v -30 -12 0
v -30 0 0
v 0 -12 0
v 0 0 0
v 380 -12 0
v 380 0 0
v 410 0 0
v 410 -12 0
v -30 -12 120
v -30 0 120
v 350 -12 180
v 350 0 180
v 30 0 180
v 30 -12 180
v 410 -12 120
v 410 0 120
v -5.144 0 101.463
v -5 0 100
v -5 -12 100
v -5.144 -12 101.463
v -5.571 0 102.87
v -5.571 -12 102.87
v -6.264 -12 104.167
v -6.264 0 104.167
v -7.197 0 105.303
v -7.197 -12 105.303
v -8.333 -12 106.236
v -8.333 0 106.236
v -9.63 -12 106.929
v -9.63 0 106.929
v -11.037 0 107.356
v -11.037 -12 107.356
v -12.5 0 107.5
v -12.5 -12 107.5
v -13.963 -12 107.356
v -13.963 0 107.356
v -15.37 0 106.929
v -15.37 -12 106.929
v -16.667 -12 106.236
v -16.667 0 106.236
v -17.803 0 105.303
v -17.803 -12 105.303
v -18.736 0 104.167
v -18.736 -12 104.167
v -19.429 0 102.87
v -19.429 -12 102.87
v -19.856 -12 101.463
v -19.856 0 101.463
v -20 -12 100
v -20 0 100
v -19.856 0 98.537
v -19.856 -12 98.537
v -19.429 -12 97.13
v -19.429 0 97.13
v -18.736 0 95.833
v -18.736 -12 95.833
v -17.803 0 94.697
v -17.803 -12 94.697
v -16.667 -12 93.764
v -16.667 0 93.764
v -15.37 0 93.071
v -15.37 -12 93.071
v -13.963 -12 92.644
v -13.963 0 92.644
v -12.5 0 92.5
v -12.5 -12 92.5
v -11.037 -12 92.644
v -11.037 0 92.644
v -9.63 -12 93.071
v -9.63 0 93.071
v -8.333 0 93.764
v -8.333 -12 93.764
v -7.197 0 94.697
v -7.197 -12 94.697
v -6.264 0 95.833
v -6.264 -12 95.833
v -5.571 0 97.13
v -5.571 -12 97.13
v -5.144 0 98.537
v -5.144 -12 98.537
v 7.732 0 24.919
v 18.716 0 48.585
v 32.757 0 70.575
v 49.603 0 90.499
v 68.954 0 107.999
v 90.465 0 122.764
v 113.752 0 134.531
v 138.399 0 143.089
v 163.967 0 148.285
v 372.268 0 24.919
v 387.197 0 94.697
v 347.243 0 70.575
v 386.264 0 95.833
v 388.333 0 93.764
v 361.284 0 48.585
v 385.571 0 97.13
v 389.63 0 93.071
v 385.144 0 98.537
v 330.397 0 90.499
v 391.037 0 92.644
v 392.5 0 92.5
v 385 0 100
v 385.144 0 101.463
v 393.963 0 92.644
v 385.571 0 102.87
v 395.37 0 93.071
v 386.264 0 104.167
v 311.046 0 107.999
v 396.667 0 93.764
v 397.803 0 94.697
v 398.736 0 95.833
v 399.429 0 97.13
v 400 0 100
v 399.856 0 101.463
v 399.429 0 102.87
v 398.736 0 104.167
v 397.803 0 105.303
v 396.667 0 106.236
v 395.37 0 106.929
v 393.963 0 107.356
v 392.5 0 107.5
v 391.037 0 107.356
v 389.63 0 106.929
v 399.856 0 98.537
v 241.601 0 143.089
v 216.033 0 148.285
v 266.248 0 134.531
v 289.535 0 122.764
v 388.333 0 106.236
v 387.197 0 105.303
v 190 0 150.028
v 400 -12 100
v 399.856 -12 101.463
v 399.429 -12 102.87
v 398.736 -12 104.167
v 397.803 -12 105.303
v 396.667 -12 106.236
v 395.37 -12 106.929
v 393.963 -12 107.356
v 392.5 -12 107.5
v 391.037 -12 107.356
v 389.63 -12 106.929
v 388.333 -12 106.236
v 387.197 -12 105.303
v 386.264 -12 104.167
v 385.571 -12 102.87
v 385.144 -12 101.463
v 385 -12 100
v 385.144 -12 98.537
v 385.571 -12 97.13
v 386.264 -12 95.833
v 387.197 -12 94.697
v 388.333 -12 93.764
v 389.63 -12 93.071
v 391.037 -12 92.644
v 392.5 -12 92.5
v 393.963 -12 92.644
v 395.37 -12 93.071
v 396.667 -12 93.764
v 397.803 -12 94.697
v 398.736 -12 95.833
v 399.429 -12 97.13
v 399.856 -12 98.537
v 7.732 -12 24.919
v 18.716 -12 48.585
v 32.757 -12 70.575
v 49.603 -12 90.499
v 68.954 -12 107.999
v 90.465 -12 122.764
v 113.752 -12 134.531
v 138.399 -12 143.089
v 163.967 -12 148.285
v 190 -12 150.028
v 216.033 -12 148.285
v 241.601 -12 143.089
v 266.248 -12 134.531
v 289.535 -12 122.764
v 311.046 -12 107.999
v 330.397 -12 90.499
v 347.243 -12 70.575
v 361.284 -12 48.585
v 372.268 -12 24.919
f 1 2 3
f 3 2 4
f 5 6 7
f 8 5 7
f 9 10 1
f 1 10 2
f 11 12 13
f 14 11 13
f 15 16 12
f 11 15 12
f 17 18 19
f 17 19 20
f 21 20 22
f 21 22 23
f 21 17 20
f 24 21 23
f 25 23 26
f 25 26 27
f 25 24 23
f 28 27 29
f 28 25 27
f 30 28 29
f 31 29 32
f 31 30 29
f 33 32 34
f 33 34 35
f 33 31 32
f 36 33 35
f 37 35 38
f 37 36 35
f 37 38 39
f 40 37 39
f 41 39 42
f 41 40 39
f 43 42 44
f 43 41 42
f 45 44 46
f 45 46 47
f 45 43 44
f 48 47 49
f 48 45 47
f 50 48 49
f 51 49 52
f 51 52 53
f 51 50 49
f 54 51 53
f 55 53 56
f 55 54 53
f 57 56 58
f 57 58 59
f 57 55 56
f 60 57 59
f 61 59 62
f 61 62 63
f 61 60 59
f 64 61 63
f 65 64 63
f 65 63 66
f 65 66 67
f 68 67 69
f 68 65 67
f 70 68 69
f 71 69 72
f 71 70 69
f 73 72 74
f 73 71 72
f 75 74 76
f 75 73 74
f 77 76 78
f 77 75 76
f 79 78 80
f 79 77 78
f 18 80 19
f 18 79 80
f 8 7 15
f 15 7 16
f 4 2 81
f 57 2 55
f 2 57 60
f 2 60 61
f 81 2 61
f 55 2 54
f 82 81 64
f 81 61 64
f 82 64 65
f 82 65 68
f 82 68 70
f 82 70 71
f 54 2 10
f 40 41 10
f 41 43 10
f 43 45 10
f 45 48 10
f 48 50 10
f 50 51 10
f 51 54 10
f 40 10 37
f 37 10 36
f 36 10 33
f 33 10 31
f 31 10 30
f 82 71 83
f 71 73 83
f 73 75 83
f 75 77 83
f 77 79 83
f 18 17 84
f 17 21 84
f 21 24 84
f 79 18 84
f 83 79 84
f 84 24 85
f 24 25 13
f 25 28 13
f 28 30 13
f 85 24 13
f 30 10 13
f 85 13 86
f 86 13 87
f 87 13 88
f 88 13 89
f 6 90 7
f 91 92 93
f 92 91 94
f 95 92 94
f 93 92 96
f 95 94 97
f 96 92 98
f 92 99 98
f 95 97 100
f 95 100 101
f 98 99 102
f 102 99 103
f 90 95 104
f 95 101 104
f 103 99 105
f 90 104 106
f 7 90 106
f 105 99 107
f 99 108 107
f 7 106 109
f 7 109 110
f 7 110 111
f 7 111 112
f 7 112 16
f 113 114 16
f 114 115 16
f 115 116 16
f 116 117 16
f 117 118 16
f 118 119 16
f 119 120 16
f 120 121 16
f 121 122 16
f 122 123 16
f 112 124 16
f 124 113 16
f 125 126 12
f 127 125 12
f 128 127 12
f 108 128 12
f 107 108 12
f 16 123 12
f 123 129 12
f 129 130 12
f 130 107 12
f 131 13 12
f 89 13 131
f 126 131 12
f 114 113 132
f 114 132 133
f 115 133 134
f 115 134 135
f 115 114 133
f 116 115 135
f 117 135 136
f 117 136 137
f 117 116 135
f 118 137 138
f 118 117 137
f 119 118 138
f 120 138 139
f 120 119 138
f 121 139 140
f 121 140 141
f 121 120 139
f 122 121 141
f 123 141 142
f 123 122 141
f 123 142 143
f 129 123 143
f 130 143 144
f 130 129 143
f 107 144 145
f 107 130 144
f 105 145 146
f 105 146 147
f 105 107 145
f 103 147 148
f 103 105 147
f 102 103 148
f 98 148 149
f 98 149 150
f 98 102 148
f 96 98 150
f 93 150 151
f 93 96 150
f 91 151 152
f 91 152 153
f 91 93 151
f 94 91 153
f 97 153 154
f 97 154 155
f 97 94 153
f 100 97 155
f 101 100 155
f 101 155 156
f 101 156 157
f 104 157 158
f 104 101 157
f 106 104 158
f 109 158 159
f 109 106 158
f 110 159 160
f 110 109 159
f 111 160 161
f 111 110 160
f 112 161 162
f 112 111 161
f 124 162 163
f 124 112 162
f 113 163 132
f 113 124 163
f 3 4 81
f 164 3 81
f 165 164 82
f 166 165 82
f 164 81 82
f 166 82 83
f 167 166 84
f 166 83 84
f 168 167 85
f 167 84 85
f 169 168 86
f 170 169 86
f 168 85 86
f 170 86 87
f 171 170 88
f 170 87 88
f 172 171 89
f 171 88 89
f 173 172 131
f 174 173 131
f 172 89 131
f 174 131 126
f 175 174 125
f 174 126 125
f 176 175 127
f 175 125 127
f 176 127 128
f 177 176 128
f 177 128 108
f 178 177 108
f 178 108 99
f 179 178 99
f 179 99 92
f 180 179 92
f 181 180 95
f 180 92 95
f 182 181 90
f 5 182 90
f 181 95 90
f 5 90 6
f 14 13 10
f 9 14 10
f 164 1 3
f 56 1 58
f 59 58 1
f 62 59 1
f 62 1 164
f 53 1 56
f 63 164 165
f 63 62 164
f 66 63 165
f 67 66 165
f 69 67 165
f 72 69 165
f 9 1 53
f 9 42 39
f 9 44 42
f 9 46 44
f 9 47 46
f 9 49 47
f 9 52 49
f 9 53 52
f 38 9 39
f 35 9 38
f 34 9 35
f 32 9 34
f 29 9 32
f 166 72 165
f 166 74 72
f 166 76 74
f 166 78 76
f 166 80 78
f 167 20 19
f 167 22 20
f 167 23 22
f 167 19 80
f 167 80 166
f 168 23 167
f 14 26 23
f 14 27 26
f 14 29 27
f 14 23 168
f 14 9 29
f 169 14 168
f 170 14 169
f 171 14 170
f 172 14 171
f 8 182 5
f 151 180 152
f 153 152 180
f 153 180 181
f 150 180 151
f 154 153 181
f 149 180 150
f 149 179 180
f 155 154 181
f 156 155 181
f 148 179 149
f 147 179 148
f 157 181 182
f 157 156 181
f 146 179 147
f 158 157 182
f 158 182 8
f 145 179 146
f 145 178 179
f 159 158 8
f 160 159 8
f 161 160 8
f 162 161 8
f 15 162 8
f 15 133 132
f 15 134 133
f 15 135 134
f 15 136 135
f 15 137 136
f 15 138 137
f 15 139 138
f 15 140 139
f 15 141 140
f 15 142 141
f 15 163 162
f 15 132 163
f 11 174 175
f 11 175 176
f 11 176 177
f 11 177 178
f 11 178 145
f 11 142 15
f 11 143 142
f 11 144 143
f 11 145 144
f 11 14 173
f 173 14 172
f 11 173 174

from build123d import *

# Parameters (mm, degrees)
F0_R     = 7.5
F1_DEPTH = 12


with BuildPart() as f1:
    # F0 (on Front) → F1 (new body)
    with BuildSketch(Plane.XZ):
        with BuildLine():
            ThreePointArc((0, 0), (190, 150.027898), (380, 0))
            Line((380, 0), (410, 0))
            Line((410, 0), (410, 120))
            Line((410, 120), (350, 180))
            Line((350, 180), (30, 180))
            Line((30, 180), (-30, 120))
            Line((-30, 120), (-30, 0))
            Line((-30, 0), (0, 0))
        make_face()
        with Locations((-12.5, 100)):
            Circle(F0_R, mode=Mode.SUBTRACT)
        with Locations((392.5, 100)):
            Circle(F0_R, mode=Mode.SUBTRACT)
    extrude(amount=F1_DEPTH)


solid = f1.part
